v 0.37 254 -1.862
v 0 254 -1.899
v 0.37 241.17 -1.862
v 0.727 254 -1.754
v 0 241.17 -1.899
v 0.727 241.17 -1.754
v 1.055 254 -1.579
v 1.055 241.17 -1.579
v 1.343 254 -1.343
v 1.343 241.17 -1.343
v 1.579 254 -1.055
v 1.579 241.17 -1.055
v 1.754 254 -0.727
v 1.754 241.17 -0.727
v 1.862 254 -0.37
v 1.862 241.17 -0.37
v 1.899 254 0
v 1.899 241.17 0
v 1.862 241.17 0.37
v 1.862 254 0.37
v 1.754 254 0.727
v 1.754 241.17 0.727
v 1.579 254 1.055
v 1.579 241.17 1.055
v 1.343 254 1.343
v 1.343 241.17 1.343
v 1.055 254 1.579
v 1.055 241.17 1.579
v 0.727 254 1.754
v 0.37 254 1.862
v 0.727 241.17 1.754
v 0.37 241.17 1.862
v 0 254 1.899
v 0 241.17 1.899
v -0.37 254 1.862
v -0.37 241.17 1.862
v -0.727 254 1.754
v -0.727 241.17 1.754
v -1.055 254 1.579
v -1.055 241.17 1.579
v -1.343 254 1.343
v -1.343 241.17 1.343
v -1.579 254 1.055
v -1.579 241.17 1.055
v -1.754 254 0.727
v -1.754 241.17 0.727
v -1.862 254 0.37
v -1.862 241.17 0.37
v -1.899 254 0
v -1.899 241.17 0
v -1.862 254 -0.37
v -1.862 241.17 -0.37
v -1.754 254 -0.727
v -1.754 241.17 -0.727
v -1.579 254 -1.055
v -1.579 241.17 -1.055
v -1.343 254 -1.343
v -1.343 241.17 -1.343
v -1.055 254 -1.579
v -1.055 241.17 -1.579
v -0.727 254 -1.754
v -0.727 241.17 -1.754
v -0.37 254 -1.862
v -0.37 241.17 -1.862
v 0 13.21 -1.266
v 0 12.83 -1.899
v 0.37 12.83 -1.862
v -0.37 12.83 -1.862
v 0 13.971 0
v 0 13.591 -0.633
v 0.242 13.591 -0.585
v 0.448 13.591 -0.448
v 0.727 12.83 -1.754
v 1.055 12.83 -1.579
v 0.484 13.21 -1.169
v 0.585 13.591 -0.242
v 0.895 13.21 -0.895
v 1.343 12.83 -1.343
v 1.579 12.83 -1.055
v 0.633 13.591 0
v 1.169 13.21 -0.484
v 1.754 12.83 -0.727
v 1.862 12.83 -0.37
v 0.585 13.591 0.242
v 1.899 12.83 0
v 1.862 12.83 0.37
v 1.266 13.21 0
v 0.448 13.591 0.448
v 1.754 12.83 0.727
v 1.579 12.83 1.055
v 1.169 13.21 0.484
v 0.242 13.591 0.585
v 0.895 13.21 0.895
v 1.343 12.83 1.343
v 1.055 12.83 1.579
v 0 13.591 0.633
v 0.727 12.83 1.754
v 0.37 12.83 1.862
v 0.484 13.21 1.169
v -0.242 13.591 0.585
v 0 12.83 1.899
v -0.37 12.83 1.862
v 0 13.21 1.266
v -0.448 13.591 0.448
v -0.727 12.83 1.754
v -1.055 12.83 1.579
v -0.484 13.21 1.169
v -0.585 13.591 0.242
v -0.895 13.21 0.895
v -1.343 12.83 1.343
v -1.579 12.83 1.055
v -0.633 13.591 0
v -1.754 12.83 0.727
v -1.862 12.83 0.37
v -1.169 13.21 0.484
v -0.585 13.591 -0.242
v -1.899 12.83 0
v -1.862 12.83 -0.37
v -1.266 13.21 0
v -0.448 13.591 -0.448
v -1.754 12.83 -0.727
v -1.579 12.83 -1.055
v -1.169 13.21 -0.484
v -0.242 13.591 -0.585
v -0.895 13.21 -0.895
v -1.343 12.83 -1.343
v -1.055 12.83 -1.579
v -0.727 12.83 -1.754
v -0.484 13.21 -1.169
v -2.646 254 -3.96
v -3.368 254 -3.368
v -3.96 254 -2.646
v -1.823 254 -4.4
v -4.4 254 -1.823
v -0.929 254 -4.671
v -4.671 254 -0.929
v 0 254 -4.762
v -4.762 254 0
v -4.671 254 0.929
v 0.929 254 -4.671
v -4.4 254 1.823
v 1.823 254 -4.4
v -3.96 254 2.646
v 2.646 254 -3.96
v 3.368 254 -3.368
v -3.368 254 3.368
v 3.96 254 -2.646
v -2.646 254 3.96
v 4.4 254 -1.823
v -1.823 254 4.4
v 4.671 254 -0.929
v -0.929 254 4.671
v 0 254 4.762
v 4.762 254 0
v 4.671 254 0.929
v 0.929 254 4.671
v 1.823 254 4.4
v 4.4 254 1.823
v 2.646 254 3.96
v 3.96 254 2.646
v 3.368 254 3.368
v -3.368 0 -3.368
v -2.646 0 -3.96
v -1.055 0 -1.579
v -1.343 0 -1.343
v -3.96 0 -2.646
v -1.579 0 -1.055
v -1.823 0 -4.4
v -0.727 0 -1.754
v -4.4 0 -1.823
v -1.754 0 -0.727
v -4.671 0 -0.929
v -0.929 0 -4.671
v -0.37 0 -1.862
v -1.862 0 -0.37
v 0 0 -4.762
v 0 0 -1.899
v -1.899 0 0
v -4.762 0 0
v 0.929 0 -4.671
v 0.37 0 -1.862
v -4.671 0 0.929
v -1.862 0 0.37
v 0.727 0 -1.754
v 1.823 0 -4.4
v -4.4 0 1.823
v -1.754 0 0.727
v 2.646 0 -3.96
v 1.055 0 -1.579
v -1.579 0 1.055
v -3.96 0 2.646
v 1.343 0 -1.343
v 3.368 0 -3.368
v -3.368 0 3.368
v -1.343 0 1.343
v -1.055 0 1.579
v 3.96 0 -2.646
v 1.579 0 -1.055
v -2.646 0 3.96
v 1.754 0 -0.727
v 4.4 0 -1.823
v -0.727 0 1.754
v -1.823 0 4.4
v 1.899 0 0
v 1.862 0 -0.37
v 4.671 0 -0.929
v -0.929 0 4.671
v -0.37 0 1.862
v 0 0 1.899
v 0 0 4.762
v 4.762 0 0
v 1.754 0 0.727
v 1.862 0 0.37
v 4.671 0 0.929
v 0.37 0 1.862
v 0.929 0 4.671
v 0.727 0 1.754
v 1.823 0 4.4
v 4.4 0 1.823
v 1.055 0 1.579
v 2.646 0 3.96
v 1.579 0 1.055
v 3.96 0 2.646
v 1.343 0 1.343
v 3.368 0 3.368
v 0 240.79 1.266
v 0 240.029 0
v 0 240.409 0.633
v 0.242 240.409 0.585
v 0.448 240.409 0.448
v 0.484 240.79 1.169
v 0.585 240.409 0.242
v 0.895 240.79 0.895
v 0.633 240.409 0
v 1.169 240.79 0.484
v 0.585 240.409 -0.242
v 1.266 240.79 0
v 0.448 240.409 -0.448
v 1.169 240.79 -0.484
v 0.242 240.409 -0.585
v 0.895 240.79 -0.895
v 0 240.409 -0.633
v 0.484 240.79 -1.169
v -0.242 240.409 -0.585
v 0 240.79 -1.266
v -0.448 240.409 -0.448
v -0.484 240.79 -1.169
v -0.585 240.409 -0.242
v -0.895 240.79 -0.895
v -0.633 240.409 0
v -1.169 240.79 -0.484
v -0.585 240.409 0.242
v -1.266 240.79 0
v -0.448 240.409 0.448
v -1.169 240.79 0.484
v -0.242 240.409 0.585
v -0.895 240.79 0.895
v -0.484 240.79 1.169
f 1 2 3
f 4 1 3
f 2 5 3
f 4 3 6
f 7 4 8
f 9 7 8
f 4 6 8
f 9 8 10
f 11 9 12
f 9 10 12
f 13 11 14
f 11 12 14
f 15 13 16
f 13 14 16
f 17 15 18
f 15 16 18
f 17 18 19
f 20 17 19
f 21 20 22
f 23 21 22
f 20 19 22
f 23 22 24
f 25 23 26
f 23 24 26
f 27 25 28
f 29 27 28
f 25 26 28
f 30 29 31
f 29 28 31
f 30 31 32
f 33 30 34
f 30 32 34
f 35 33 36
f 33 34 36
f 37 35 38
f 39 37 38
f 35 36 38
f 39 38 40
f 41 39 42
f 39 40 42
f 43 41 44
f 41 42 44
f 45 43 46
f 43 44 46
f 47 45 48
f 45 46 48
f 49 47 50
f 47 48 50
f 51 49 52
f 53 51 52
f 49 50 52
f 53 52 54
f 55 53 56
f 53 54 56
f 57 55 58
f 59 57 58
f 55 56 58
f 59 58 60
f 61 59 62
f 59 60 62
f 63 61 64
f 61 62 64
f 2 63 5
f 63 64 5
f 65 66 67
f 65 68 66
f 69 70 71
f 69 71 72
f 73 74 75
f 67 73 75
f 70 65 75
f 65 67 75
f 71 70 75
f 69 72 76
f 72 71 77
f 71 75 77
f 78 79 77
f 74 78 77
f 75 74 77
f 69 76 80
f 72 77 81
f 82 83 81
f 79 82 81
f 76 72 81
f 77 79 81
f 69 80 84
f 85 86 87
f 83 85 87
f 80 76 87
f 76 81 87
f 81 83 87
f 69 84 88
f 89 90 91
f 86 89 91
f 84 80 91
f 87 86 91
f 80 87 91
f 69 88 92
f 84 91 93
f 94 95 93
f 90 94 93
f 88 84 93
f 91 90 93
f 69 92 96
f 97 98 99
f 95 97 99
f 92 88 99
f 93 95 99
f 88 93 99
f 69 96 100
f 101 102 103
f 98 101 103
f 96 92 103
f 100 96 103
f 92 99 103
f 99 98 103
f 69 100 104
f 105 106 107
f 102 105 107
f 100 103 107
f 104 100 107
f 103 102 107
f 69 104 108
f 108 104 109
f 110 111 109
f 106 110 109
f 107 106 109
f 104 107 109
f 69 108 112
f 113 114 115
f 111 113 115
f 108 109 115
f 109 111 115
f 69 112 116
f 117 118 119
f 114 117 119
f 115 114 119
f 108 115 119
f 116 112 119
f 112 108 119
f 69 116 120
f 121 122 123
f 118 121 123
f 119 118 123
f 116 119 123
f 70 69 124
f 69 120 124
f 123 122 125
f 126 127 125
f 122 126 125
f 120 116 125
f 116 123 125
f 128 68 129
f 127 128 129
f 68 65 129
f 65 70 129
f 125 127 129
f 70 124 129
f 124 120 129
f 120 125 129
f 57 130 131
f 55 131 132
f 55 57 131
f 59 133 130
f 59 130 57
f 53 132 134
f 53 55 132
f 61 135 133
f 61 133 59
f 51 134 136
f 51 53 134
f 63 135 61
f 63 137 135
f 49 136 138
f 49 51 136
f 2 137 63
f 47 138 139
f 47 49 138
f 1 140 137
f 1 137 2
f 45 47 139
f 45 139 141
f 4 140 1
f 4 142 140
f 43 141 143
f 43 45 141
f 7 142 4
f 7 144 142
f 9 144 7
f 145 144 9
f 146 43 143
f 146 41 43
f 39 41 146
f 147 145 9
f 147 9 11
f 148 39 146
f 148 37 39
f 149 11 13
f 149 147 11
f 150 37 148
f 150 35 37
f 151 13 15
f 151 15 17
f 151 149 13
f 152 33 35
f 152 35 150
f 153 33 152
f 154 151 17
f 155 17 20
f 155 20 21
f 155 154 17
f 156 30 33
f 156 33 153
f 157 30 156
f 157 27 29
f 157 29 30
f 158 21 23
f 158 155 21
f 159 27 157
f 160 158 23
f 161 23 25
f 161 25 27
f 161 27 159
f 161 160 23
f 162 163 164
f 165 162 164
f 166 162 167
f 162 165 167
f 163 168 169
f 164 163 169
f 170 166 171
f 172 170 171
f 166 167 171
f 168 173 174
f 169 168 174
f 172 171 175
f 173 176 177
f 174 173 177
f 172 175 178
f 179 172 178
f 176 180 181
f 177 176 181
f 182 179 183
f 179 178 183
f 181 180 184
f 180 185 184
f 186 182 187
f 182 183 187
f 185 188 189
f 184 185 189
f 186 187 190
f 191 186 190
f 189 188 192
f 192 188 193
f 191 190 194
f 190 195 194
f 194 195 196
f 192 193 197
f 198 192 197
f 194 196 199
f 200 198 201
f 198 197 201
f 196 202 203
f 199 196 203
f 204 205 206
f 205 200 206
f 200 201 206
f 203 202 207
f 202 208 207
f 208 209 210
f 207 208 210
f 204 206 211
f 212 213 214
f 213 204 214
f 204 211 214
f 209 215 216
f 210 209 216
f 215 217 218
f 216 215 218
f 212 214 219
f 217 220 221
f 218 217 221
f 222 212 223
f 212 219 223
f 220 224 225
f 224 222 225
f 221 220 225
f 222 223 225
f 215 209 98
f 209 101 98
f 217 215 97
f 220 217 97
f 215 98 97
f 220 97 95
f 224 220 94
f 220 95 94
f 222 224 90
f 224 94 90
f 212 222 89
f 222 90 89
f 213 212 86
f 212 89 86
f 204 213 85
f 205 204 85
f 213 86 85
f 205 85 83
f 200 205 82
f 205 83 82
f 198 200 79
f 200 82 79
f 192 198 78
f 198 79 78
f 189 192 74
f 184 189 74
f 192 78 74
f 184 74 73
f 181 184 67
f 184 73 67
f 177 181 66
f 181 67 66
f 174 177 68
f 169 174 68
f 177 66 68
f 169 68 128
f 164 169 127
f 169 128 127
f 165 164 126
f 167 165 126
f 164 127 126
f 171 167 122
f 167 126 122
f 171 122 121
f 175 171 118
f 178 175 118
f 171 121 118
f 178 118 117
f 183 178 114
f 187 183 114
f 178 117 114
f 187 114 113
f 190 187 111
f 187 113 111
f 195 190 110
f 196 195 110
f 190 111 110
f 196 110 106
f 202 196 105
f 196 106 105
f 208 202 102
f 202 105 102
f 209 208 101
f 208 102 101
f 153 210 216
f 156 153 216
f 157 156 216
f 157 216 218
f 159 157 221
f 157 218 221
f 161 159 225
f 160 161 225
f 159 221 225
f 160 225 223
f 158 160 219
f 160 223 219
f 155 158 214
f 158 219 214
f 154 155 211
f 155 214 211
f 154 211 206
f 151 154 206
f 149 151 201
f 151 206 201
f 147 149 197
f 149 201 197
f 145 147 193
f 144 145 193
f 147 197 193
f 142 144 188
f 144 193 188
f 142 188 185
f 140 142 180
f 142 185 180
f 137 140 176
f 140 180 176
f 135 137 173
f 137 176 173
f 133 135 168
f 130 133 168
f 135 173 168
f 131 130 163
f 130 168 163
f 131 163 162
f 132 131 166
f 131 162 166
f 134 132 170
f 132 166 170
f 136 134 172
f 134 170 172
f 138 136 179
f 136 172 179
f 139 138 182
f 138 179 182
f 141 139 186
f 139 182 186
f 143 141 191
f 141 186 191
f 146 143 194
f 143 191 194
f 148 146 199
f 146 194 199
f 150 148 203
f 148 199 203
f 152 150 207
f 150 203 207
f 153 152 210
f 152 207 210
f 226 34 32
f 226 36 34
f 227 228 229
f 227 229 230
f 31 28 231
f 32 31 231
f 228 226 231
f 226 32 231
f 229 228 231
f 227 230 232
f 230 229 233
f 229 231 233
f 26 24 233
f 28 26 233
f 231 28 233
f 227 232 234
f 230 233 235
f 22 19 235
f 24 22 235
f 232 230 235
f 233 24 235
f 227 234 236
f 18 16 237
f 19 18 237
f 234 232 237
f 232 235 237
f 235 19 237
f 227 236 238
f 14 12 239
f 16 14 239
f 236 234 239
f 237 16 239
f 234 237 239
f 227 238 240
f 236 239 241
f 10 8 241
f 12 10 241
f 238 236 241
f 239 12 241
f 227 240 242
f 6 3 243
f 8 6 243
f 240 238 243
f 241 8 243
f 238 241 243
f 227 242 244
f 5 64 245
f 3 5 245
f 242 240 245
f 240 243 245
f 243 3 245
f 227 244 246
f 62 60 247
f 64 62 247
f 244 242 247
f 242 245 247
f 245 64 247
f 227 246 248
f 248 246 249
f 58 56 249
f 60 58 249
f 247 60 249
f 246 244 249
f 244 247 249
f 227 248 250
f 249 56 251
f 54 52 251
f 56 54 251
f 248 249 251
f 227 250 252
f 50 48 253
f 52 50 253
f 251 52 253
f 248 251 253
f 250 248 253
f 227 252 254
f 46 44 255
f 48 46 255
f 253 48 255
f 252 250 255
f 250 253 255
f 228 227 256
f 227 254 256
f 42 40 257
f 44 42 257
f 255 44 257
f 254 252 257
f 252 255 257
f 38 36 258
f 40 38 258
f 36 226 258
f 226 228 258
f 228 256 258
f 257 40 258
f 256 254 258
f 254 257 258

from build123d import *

# Parameters (mm, degrees)
SKETCH1_R                            = 4.7625
BOSS_EXTRUDE1_DEPTH                  = 254
F_10_24_TAPPED_HOLE1_D               = 3.7973
F_10_24_TAPPED_HOLE1_DEPTH           = 12.83
F_10_24_TAPPED_HOLE1_TIP             = 1.140824014
F_10_24_TAPPED_HOLE1_ON_FACE_2_D     = 3.7973
F_10_24_TAPPED_HOLE1_ON_FACE_2_DEPTH = 12.83
F_10_24_TAPPED_HOLE1_ON_FACE_2_TIP   = 1.140824014


with BuildPart() as part:
    # Sketch1 → Boss-Extrude1 (new body)
    with BuildSketch(Plane(origin=(0, 0, 0), x_dir=(1, 0, 0), z_dir=(0, 1, 0))):
        with Locations(Location((0, 0, 0), (0, 0, 270))):
            Circle(SKETCH1_R)
    extrude(amount=BOSS_EXTRUDE1_DEPTH)

    # #10-24 Tapped Hole1
    with Locations(Plane.ZX.offset(254)):
        with Locations((0, 0)):
            Hole(F_10_24_TAPPED_HOLE1_D / 2, depth=F_10_24_TAPPED_HOLE1_DEPTH)
            with Locations((0, 0, -(F_10_24_TAPPED_HOLE1_DEPTH + F_10_24_TAPPED_HOLE1_TIP / 2))):  # 118° drill point
                Cone(0, F_10_24_TAPPED_HOLE1_D / 2, F_10_24_TAPPED_HOLE1_TIP, mode=Mode.SUBTRACT)

    # #10-24 Tapped Hole1 on face 2
    with Locations(Plane(origin=(0, 0, 0), x_dir=(0, 0, -1), z_dir=(0, -1, 0))):
        with Locations((0, 0)):
            Hole(F_10_24_TAPPED_HOLE1_ON_FACE_2_D / 2, depth=F_10_24_TAPPED_HOLE1_ON_FACE_2_DEPTH)
            with Locations((0, 0, -(F_10_24_TAPPED_HOLE1_ON_FACE_2_DEPTH + F_10_24_TAPPED_HOLE1_ON_FACE_2_TIP / 2))):  # 118° drill point
                Cone(0, F_10_24_TAPPED_HOLE1_ON_FACE_2_D / 2, F_10_24_TAPPED_HOLE1_ON_FACE_2_TIP, mode=Mode.SUBTRACT)


solid = part.part
